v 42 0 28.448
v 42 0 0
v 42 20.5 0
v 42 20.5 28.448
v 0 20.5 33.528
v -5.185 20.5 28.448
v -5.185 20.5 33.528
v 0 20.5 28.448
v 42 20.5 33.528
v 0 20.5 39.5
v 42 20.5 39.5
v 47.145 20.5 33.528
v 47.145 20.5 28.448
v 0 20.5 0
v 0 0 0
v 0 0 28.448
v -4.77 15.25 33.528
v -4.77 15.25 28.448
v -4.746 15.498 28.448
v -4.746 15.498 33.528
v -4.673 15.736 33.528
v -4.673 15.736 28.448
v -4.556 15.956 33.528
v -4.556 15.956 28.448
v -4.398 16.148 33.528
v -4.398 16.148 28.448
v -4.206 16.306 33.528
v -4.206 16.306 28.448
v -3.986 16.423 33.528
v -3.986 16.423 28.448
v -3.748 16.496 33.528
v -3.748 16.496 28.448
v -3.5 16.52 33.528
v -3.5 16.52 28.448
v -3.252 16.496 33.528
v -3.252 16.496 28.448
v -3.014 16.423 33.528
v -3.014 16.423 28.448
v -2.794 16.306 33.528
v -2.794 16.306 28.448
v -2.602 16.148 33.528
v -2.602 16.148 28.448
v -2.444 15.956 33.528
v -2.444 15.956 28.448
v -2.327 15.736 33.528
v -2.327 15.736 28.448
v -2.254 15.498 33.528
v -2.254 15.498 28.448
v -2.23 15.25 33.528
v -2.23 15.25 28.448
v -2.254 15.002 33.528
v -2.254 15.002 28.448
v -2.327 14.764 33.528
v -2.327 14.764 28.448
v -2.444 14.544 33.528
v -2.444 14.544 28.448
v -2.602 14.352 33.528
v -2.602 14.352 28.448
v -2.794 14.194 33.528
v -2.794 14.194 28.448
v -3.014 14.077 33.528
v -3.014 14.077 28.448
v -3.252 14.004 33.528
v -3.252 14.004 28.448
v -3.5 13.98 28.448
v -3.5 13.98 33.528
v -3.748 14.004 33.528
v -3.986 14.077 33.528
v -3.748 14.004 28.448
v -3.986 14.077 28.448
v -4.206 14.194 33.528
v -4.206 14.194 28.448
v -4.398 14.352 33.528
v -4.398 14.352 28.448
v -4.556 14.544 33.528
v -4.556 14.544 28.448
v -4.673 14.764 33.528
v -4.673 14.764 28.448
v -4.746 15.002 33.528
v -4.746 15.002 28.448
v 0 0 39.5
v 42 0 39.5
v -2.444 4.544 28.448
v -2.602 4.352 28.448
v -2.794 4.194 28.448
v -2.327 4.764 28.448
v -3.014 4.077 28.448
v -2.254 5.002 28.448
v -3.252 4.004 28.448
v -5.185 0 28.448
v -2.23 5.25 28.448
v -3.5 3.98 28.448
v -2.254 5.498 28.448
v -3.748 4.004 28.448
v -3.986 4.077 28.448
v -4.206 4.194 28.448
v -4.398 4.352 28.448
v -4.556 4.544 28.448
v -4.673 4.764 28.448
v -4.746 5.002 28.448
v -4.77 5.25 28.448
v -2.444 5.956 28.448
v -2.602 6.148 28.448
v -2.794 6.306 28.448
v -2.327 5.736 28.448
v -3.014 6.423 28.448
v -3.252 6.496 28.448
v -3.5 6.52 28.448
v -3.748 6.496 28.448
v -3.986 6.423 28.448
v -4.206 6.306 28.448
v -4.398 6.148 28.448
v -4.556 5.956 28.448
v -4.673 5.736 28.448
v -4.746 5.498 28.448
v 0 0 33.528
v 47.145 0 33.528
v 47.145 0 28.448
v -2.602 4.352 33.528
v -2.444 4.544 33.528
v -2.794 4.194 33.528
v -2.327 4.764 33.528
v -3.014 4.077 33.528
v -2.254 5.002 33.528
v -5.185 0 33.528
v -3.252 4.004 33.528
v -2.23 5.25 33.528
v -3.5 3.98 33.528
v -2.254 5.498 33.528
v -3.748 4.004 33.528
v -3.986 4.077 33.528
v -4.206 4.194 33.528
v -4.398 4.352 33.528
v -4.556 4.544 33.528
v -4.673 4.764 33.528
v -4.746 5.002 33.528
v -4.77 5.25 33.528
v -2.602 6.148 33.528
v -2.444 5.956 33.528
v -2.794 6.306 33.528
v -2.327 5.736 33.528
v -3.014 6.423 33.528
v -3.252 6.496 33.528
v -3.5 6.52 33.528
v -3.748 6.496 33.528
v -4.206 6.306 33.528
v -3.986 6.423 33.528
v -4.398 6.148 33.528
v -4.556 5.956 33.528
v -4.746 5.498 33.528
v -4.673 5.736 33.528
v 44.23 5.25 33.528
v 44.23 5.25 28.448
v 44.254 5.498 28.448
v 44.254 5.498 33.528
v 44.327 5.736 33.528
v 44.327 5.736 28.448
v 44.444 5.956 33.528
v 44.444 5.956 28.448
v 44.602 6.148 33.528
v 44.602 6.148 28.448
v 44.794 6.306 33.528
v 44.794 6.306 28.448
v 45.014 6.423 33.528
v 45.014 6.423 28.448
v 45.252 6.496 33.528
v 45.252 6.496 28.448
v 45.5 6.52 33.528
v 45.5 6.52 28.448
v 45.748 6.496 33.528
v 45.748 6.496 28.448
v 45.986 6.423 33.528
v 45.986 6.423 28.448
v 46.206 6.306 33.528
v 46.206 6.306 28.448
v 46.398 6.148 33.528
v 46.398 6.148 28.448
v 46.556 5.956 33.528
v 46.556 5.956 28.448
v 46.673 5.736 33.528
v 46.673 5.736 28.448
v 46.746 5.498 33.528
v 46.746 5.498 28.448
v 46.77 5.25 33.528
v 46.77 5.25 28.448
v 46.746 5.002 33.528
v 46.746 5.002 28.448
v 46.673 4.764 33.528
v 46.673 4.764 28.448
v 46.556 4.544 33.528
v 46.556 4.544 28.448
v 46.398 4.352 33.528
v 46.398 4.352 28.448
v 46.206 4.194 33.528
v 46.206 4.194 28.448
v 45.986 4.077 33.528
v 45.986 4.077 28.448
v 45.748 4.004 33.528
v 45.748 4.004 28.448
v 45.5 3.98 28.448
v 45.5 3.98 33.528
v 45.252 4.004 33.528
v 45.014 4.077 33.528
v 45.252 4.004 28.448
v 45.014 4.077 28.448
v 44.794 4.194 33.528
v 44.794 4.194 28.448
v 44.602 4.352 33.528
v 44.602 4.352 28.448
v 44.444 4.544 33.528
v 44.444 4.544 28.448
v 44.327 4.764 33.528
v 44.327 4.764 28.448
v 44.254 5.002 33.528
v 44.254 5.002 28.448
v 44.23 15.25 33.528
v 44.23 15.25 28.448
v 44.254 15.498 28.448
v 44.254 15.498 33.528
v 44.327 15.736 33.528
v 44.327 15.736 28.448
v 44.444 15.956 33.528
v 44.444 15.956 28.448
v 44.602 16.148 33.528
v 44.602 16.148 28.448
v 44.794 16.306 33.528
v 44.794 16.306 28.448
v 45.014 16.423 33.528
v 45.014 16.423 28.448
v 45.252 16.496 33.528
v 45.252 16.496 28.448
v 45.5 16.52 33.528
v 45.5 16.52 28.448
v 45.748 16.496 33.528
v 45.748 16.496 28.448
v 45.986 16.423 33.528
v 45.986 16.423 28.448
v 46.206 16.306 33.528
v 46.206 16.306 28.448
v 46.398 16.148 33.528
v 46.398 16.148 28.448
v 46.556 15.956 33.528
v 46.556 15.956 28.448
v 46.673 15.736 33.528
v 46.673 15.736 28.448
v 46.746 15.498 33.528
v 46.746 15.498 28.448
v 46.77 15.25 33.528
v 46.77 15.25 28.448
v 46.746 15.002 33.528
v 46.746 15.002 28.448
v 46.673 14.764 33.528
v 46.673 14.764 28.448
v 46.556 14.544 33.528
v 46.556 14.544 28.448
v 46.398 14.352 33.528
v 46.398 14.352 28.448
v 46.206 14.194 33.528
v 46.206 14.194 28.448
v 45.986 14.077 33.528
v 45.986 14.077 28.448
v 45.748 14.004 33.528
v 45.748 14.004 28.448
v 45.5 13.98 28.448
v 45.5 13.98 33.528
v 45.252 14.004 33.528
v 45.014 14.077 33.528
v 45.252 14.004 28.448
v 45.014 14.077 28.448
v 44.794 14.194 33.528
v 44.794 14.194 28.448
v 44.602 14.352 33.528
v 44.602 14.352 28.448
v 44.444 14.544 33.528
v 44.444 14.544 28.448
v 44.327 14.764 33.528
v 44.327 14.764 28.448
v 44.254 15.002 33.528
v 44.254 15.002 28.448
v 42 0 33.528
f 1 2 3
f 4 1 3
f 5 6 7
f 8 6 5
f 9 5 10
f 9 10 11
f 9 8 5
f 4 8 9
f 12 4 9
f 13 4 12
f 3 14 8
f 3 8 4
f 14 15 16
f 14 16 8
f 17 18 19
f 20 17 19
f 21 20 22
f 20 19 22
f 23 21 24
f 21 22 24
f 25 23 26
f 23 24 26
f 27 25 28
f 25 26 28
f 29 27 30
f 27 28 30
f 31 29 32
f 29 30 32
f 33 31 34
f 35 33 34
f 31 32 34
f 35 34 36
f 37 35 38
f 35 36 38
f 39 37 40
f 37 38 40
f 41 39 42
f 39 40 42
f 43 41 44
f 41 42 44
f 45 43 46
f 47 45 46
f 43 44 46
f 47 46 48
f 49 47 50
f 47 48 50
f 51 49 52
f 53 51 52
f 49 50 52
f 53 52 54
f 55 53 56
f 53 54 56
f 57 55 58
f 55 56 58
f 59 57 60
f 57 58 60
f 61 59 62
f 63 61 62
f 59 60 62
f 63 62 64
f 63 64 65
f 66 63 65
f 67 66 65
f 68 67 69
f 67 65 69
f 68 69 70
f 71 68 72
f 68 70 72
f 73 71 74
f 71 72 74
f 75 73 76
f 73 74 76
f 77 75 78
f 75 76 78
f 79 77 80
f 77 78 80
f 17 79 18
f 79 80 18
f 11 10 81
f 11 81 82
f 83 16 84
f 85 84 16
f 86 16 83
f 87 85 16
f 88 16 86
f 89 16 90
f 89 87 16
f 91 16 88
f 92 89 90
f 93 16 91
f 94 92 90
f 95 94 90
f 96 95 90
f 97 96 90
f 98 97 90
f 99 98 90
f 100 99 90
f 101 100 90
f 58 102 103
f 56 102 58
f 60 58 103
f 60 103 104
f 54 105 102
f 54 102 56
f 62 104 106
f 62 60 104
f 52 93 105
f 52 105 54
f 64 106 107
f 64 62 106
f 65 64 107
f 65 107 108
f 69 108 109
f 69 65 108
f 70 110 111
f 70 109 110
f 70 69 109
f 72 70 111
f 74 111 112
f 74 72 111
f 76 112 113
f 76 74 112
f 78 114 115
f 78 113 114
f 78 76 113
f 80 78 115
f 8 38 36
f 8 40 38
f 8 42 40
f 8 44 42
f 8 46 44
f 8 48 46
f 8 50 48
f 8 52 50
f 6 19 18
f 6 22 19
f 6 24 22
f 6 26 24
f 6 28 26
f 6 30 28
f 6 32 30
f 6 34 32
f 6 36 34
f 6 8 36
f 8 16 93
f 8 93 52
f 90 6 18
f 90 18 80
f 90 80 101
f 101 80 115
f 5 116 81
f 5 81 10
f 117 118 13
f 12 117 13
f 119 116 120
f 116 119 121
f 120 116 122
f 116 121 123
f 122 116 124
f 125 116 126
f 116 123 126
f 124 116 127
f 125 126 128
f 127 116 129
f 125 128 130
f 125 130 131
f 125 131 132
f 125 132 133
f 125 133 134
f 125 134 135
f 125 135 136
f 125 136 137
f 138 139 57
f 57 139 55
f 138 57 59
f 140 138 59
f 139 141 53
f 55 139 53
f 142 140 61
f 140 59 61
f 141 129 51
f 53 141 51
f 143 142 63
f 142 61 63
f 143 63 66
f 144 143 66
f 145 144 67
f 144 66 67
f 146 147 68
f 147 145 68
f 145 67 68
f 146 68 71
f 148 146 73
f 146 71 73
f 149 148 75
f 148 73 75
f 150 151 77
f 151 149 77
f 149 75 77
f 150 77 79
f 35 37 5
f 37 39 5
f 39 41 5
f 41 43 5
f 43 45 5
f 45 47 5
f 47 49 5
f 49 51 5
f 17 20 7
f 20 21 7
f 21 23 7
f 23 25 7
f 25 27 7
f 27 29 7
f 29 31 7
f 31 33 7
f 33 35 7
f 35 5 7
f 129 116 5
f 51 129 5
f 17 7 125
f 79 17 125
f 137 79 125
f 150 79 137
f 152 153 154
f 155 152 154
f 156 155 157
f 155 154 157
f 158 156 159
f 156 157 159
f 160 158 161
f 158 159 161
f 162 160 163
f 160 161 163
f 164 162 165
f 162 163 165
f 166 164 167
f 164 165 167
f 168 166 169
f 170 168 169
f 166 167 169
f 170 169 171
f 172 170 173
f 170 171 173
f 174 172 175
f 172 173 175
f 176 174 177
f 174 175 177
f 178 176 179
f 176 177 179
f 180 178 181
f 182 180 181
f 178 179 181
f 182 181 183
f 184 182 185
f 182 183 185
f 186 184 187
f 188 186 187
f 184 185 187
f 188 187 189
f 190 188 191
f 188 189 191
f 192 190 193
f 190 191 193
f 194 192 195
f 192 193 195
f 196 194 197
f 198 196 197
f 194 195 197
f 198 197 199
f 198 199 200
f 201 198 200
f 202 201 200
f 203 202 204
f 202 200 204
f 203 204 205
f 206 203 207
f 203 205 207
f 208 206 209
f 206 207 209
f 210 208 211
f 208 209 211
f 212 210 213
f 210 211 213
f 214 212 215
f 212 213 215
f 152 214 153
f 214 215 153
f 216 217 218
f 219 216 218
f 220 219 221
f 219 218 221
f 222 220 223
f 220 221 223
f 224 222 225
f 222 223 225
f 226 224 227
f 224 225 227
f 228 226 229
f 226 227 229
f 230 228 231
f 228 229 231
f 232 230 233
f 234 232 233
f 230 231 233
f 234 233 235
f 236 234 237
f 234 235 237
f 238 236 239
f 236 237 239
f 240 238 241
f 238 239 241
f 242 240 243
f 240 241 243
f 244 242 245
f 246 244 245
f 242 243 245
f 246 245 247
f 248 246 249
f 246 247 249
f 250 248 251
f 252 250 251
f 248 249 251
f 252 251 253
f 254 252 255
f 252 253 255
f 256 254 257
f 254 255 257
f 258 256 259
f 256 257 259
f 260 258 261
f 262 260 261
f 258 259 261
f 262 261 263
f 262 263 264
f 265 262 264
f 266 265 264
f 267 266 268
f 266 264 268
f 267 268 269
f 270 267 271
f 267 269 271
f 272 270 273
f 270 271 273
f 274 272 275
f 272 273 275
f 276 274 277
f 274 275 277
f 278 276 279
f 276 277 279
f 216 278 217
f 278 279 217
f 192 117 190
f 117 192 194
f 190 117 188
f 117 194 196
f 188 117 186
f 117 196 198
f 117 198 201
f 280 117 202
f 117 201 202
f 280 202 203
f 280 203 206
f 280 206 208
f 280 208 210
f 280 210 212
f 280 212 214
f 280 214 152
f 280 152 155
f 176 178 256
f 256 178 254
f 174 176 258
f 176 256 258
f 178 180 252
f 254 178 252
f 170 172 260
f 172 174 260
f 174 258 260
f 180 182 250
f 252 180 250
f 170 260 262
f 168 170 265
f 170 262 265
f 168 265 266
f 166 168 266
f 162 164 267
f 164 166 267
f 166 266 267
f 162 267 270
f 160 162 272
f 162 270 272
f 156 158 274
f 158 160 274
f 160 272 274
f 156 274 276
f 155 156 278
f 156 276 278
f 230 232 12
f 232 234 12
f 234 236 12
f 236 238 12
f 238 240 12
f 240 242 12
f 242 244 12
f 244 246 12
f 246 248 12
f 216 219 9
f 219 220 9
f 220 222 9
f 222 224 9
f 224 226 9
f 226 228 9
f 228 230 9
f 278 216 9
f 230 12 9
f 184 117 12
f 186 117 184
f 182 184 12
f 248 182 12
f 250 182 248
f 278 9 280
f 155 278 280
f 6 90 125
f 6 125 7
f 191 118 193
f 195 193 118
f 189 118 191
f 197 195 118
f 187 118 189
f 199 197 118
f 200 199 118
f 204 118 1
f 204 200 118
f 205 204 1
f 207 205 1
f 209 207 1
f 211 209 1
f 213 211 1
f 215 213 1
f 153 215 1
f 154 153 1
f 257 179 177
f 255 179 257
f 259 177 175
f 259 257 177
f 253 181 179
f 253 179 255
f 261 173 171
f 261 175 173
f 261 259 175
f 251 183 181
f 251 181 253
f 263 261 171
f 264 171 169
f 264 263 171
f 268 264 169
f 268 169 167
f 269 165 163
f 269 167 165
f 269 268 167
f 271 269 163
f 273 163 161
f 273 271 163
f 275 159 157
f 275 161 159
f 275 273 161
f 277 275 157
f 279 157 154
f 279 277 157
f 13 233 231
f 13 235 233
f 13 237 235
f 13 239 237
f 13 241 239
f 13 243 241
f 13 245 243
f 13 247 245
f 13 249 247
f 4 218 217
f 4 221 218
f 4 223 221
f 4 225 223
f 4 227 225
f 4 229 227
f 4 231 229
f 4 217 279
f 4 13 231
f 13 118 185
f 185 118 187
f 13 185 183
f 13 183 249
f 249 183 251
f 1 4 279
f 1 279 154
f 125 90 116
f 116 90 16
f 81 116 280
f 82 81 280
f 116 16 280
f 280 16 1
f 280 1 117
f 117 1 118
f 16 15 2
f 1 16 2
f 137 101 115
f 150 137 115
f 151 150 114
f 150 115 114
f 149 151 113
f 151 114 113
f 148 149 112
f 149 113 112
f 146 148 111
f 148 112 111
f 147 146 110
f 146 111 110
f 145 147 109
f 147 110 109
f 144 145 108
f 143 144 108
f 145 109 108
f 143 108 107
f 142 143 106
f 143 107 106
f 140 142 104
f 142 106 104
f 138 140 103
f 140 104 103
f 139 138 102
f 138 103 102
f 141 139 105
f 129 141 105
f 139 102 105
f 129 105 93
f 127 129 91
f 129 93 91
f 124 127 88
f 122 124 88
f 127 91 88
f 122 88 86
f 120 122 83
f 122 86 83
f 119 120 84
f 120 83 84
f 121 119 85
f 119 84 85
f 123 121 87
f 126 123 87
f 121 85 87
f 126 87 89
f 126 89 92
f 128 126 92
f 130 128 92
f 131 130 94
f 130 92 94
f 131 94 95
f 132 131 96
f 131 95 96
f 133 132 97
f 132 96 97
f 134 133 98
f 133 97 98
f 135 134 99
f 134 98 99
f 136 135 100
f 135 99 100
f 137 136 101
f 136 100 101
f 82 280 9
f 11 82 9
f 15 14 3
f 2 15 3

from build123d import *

# Parameters (mm, degrees)
SKETCH1_W           = 42
SKETCH1_H           = 20.5
BOSS_EXTRUDE1_DEPTH = 39.5
SKETCH2_W           = 5.185118418
SKETCH2_H           = 20.5
SKETCH2_R           = 1.27
SKETCH2_W_2         = 5.144602193
BOSS_EXTRUDE2_DEPTH = 5.08


with BuildPart() as part:
    # Sketch1 → Boss-Extrude1 (new body)
    with BuildSketch(Plane.XY):
        with Locations((21, 10.25)):
            Rectangle(SKETCH1_W, SKETCH1_H)
    extrude(amount=BOSS_EXTRUDE1_DEPTH)

    # Sketch2 → Boss-Extrude2 (add)
    with BuildSketch(Plane(origin=(0, 0, 28.448), x_dir=(-1, 0, 0), z_dir=(0, 0, -1))):
        with Locations((2.592559209, 10.25)):
            Rectangle(SKETCH2_W, SKETCH2_H)
        with Locations((3.5, 5.25)):
            Circle(SKETCH2_R, mode=Mode.SUBTRACT)
        with Locations((3.5, 15.25)):
            Circle(SKETCH2_R, mode=Mode.SUBTRACT)
        with Locations((-44.572301096, 10.25)):
            Rectangle(SKETCH2_W_2, SKETCH2_H)
        with Locations((-45.5, 5.25)):
            Circle(SKETCH2_R, mode=Mode.SUBTRACT)
        with Locations((-45.5, 15.25)):
            Circle(SKETCH2_R, mode=Mode.SUBTRACT)
    extrude(amount=-BOSS_EXTRUDE2_DEPTH)


solid = part.part
